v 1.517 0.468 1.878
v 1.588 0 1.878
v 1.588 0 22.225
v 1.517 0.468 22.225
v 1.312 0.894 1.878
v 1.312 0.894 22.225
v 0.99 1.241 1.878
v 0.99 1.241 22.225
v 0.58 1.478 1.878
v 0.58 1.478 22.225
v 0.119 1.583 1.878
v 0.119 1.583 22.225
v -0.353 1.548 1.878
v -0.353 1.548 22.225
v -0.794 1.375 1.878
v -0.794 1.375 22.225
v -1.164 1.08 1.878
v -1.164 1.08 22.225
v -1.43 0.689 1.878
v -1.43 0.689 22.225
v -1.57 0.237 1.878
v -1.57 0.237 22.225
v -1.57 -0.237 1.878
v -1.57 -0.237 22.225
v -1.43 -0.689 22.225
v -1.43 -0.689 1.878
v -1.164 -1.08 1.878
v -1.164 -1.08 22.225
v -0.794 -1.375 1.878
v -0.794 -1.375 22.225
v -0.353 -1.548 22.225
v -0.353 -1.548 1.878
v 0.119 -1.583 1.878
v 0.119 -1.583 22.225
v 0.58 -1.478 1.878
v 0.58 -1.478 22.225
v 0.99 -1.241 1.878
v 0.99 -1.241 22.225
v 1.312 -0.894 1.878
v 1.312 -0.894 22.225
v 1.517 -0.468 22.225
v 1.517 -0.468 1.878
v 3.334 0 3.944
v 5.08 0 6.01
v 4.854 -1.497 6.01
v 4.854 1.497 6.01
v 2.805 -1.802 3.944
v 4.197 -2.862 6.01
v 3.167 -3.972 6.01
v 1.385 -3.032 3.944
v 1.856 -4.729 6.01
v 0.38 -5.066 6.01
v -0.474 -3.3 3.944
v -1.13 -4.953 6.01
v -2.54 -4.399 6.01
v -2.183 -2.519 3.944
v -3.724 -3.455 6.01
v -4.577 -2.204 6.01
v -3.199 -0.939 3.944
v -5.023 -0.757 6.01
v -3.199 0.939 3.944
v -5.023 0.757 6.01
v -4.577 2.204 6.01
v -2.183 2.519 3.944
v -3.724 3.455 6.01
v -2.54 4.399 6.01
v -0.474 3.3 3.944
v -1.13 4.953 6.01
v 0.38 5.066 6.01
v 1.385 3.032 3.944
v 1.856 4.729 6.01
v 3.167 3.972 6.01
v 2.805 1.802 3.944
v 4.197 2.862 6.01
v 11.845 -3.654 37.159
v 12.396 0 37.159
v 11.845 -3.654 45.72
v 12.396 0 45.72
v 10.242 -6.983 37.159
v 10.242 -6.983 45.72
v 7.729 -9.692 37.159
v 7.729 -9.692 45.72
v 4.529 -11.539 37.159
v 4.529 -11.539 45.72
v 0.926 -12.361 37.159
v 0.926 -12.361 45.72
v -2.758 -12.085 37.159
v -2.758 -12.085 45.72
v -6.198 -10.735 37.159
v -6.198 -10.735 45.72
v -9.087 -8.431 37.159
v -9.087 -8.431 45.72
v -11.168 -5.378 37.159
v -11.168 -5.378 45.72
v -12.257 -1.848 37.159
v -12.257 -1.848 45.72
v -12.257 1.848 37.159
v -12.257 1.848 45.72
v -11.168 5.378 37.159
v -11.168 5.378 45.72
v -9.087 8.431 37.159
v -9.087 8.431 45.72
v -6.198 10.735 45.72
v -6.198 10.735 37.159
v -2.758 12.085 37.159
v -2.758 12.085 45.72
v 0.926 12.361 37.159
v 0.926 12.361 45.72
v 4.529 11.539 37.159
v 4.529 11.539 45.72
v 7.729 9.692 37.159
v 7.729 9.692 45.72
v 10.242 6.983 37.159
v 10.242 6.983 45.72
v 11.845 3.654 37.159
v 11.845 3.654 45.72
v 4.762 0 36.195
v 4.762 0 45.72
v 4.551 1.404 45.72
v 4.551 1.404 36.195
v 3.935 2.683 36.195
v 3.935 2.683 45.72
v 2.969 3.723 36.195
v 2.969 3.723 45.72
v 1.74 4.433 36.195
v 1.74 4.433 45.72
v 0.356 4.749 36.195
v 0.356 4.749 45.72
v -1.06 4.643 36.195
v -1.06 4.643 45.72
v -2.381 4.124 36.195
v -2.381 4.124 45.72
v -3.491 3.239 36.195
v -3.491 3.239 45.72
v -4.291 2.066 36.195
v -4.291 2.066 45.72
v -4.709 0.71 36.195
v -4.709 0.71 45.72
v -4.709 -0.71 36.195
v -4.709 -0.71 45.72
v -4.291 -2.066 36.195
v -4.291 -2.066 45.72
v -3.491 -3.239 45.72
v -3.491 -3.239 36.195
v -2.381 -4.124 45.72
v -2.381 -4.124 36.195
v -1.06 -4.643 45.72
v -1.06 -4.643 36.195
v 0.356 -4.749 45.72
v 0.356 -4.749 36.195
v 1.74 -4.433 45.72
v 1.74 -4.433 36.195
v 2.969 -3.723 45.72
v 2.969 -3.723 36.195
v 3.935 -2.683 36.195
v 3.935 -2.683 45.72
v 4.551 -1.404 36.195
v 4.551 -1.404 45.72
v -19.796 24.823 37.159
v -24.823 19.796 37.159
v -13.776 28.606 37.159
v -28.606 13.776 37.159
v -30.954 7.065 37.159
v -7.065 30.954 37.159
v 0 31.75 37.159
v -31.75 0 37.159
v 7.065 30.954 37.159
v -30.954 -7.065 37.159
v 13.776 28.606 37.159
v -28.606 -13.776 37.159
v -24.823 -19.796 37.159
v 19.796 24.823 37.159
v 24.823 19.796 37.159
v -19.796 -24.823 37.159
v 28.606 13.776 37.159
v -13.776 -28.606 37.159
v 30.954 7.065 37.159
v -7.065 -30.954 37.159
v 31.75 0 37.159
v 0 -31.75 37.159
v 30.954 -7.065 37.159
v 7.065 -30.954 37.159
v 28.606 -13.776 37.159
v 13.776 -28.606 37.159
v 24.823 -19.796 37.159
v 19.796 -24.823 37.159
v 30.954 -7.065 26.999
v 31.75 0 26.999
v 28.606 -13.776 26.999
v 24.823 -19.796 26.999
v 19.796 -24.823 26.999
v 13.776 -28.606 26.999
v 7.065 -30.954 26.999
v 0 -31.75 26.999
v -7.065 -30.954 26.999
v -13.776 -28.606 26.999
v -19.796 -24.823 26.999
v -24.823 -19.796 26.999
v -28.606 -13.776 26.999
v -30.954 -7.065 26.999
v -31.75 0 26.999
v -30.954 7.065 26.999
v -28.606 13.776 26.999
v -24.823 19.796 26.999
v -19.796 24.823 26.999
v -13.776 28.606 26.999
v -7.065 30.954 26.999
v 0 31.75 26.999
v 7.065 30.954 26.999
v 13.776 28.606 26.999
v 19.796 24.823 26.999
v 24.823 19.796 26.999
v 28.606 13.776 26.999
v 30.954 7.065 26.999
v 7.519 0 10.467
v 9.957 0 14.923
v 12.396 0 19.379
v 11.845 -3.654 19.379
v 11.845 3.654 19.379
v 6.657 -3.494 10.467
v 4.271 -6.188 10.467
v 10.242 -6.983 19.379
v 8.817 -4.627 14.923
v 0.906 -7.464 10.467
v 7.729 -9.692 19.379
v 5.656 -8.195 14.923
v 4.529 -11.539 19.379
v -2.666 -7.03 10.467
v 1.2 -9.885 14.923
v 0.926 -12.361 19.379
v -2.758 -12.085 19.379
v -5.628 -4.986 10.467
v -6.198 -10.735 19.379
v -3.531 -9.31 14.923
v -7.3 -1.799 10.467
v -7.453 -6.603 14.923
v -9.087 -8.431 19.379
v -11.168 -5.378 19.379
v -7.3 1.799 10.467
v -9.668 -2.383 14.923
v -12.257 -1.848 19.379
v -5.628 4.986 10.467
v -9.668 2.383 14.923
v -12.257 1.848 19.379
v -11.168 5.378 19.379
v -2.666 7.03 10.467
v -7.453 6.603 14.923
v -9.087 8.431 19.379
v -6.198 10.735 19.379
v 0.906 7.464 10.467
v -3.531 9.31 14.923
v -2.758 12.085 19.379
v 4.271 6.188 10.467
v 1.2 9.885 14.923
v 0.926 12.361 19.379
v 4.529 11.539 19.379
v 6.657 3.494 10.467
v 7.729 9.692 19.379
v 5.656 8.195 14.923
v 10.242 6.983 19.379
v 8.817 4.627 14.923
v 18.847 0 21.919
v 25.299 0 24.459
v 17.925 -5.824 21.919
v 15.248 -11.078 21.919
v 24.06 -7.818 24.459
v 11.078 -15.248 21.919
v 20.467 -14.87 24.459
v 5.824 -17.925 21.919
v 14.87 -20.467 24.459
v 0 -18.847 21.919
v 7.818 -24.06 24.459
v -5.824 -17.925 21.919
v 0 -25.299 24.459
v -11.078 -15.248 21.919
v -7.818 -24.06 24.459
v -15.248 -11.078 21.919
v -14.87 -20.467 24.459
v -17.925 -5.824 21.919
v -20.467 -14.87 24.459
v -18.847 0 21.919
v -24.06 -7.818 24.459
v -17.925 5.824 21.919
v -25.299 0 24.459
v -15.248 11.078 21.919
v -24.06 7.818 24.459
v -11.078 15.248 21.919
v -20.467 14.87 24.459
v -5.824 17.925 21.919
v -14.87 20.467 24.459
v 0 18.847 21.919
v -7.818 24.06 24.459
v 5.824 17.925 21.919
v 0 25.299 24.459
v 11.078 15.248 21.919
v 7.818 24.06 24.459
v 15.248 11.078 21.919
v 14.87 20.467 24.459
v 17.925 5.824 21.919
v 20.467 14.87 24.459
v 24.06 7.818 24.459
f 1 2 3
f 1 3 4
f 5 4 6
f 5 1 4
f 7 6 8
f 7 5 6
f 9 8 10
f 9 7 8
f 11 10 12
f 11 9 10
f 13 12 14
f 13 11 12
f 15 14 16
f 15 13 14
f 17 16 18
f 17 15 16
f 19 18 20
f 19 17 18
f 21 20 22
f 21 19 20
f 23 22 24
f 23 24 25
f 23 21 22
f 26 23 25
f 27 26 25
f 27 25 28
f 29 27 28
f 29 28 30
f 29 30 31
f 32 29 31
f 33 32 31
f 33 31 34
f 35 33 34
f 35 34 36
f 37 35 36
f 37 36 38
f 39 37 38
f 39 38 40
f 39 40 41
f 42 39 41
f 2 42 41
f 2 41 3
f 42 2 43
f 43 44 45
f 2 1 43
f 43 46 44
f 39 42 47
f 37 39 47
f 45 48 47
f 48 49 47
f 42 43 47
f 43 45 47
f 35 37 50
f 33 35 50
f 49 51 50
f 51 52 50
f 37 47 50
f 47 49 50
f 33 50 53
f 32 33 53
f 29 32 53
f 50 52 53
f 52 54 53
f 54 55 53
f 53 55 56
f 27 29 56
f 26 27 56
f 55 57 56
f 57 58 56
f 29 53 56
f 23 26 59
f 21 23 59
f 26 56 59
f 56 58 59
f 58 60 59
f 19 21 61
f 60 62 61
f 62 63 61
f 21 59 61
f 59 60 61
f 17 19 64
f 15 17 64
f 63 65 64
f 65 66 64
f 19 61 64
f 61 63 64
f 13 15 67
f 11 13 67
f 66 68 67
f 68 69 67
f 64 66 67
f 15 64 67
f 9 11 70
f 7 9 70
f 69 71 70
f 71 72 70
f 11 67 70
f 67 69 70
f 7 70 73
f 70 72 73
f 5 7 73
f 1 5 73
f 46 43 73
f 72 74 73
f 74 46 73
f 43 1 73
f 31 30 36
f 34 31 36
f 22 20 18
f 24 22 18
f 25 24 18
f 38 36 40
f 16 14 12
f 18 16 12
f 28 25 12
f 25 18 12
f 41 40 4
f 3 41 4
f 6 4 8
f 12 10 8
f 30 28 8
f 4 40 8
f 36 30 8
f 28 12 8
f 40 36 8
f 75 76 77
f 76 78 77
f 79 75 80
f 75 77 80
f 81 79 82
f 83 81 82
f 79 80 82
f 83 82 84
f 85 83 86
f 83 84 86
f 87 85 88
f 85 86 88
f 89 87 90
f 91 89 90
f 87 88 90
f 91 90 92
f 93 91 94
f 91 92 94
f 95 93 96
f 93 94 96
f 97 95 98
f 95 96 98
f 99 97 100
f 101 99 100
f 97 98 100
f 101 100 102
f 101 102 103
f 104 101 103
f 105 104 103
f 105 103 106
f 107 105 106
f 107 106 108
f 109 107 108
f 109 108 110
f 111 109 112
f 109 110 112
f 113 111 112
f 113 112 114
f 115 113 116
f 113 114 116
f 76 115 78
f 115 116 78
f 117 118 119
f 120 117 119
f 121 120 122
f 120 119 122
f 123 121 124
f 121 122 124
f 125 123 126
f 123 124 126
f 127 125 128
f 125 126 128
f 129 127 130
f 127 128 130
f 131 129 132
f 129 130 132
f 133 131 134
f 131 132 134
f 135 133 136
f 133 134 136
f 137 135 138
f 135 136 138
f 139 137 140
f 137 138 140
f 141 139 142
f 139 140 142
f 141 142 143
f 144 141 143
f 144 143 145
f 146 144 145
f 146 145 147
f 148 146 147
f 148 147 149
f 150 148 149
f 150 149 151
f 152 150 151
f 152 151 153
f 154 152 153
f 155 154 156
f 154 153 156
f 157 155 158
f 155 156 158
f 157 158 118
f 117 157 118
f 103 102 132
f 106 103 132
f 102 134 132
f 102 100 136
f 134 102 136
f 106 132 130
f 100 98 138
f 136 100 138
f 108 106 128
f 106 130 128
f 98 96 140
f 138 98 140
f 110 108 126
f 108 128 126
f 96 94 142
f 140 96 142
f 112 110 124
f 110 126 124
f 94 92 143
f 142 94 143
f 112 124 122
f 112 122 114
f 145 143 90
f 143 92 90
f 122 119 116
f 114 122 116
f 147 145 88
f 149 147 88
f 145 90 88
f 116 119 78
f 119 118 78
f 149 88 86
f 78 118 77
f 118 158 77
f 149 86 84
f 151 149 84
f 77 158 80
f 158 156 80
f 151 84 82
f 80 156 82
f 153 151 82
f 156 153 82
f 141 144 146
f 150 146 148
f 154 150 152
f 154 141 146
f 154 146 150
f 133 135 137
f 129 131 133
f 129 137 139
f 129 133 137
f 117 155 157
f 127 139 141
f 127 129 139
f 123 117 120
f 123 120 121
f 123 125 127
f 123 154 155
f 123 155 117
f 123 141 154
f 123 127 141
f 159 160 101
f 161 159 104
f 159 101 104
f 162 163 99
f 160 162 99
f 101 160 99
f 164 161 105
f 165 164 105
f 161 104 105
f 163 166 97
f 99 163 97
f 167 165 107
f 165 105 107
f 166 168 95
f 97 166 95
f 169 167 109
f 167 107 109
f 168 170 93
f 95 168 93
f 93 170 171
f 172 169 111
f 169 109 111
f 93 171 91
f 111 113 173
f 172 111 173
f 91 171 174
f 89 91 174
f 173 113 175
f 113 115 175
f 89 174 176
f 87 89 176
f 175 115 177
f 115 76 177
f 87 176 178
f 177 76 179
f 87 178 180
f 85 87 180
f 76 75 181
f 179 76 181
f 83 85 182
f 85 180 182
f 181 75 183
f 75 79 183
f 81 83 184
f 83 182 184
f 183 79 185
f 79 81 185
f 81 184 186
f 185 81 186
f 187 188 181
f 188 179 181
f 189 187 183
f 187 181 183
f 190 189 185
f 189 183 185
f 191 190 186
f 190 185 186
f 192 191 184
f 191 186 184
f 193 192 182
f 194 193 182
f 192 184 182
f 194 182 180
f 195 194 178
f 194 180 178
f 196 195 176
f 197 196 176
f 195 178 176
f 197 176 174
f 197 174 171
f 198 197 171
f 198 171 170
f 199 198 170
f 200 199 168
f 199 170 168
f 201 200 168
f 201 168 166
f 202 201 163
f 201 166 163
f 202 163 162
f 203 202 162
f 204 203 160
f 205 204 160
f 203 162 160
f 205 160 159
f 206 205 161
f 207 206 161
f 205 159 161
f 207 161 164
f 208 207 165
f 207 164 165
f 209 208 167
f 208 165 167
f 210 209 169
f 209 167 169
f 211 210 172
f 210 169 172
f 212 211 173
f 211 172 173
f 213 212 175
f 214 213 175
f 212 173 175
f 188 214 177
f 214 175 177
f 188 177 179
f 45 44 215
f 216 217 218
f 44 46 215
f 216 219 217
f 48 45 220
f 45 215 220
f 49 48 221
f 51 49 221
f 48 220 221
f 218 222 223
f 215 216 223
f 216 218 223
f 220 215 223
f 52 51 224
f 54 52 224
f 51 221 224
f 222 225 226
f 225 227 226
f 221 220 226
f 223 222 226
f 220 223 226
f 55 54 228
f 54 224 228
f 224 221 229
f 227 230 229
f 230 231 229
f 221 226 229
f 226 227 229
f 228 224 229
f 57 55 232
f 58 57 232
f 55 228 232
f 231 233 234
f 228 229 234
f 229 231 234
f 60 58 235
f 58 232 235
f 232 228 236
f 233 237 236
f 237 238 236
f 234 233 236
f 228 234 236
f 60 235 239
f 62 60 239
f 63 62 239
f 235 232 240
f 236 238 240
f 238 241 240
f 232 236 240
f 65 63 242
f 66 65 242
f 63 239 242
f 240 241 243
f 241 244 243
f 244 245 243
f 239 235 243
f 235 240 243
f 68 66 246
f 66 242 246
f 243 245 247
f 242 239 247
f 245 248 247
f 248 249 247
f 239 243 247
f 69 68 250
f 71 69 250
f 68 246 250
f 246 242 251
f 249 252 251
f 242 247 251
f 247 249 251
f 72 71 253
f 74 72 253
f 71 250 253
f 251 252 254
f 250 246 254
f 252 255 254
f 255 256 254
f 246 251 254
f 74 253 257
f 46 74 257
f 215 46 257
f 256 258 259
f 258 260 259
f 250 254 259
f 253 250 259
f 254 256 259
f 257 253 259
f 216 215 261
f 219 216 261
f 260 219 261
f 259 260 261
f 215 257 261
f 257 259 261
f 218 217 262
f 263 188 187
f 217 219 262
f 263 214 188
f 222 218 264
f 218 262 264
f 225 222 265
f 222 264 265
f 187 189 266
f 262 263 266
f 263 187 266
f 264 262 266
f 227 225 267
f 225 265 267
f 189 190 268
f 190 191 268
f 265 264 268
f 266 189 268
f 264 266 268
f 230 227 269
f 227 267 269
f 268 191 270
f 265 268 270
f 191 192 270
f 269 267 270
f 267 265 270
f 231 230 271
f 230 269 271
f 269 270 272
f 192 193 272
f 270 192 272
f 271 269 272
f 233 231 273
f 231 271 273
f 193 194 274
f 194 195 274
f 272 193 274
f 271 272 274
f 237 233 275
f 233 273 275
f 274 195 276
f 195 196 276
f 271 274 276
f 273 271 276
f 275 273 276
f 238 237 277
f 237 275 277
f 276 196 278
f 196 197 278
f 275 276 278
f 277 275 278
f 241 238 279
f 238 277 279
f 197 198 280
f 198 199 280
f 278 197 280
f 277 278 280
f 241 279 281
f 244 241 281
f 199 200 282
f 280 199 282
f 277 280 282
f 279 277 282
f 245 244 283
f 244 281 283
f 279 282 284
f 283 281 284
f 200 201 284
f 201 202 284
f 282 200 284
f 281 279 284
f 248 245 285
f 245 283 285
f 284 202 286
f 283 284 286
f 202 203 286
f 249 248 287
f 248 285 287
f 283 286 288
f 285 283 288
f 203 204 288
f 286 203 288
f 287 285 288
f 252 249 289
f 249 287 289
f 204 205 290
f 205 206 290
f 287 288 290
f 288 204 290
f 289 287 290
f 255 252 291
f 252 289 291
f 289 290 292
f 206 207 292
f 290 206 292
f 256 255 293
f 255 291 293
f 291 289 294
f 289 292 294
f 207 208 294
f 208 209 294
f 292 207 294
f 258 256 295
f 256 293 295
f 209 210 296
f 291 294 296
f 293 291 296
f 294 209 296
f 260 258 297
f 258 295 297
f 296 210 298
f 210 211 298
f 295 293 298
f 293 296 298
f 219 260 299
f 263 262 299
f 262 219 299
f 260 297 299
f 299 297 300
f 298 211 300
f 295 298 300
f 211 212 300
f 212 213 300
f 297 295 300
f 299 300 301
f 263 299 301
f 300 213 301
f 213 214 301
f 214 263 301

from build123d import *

# Parameters (mm, degrees)
F2_R     = 4.7625
F3_DEPTH = 9.525
F4_R     = 1.5875
F5_DEPTH = 22.225


with BuildPart() as f1:
    # F0 (on Front) → F1 (revolve)
    with BuildSketch(Plane.XZ):
        Polygon((0, 45.72), (0, 0), (5.08, 6.010141), (12.395916, 19.379321), (31.75, 26.999321), (31.75, 37.159321), (12.395916, 37.159321), (12.395916, 45.72), align=None)
    revolve(axis=Axis((0, 0, 22.86), (0, 0, -1)))

    # F2 (on face) → F3 (cut)
    with BuildSketch(Plane.XY.offset(45.72)):
        Circle(F2_R)
    extrude(amount=-F3_DEPTH, mode=Mode.SUBTRACT)

    # F4 (on Top) → F5 (cut)
    with BuildSketch(Plane.XY):
        Circle(F4_R)
    extrude(amount=F5_DEPTH, mode=Mode.SUBTRACT)


solid = f1.part
